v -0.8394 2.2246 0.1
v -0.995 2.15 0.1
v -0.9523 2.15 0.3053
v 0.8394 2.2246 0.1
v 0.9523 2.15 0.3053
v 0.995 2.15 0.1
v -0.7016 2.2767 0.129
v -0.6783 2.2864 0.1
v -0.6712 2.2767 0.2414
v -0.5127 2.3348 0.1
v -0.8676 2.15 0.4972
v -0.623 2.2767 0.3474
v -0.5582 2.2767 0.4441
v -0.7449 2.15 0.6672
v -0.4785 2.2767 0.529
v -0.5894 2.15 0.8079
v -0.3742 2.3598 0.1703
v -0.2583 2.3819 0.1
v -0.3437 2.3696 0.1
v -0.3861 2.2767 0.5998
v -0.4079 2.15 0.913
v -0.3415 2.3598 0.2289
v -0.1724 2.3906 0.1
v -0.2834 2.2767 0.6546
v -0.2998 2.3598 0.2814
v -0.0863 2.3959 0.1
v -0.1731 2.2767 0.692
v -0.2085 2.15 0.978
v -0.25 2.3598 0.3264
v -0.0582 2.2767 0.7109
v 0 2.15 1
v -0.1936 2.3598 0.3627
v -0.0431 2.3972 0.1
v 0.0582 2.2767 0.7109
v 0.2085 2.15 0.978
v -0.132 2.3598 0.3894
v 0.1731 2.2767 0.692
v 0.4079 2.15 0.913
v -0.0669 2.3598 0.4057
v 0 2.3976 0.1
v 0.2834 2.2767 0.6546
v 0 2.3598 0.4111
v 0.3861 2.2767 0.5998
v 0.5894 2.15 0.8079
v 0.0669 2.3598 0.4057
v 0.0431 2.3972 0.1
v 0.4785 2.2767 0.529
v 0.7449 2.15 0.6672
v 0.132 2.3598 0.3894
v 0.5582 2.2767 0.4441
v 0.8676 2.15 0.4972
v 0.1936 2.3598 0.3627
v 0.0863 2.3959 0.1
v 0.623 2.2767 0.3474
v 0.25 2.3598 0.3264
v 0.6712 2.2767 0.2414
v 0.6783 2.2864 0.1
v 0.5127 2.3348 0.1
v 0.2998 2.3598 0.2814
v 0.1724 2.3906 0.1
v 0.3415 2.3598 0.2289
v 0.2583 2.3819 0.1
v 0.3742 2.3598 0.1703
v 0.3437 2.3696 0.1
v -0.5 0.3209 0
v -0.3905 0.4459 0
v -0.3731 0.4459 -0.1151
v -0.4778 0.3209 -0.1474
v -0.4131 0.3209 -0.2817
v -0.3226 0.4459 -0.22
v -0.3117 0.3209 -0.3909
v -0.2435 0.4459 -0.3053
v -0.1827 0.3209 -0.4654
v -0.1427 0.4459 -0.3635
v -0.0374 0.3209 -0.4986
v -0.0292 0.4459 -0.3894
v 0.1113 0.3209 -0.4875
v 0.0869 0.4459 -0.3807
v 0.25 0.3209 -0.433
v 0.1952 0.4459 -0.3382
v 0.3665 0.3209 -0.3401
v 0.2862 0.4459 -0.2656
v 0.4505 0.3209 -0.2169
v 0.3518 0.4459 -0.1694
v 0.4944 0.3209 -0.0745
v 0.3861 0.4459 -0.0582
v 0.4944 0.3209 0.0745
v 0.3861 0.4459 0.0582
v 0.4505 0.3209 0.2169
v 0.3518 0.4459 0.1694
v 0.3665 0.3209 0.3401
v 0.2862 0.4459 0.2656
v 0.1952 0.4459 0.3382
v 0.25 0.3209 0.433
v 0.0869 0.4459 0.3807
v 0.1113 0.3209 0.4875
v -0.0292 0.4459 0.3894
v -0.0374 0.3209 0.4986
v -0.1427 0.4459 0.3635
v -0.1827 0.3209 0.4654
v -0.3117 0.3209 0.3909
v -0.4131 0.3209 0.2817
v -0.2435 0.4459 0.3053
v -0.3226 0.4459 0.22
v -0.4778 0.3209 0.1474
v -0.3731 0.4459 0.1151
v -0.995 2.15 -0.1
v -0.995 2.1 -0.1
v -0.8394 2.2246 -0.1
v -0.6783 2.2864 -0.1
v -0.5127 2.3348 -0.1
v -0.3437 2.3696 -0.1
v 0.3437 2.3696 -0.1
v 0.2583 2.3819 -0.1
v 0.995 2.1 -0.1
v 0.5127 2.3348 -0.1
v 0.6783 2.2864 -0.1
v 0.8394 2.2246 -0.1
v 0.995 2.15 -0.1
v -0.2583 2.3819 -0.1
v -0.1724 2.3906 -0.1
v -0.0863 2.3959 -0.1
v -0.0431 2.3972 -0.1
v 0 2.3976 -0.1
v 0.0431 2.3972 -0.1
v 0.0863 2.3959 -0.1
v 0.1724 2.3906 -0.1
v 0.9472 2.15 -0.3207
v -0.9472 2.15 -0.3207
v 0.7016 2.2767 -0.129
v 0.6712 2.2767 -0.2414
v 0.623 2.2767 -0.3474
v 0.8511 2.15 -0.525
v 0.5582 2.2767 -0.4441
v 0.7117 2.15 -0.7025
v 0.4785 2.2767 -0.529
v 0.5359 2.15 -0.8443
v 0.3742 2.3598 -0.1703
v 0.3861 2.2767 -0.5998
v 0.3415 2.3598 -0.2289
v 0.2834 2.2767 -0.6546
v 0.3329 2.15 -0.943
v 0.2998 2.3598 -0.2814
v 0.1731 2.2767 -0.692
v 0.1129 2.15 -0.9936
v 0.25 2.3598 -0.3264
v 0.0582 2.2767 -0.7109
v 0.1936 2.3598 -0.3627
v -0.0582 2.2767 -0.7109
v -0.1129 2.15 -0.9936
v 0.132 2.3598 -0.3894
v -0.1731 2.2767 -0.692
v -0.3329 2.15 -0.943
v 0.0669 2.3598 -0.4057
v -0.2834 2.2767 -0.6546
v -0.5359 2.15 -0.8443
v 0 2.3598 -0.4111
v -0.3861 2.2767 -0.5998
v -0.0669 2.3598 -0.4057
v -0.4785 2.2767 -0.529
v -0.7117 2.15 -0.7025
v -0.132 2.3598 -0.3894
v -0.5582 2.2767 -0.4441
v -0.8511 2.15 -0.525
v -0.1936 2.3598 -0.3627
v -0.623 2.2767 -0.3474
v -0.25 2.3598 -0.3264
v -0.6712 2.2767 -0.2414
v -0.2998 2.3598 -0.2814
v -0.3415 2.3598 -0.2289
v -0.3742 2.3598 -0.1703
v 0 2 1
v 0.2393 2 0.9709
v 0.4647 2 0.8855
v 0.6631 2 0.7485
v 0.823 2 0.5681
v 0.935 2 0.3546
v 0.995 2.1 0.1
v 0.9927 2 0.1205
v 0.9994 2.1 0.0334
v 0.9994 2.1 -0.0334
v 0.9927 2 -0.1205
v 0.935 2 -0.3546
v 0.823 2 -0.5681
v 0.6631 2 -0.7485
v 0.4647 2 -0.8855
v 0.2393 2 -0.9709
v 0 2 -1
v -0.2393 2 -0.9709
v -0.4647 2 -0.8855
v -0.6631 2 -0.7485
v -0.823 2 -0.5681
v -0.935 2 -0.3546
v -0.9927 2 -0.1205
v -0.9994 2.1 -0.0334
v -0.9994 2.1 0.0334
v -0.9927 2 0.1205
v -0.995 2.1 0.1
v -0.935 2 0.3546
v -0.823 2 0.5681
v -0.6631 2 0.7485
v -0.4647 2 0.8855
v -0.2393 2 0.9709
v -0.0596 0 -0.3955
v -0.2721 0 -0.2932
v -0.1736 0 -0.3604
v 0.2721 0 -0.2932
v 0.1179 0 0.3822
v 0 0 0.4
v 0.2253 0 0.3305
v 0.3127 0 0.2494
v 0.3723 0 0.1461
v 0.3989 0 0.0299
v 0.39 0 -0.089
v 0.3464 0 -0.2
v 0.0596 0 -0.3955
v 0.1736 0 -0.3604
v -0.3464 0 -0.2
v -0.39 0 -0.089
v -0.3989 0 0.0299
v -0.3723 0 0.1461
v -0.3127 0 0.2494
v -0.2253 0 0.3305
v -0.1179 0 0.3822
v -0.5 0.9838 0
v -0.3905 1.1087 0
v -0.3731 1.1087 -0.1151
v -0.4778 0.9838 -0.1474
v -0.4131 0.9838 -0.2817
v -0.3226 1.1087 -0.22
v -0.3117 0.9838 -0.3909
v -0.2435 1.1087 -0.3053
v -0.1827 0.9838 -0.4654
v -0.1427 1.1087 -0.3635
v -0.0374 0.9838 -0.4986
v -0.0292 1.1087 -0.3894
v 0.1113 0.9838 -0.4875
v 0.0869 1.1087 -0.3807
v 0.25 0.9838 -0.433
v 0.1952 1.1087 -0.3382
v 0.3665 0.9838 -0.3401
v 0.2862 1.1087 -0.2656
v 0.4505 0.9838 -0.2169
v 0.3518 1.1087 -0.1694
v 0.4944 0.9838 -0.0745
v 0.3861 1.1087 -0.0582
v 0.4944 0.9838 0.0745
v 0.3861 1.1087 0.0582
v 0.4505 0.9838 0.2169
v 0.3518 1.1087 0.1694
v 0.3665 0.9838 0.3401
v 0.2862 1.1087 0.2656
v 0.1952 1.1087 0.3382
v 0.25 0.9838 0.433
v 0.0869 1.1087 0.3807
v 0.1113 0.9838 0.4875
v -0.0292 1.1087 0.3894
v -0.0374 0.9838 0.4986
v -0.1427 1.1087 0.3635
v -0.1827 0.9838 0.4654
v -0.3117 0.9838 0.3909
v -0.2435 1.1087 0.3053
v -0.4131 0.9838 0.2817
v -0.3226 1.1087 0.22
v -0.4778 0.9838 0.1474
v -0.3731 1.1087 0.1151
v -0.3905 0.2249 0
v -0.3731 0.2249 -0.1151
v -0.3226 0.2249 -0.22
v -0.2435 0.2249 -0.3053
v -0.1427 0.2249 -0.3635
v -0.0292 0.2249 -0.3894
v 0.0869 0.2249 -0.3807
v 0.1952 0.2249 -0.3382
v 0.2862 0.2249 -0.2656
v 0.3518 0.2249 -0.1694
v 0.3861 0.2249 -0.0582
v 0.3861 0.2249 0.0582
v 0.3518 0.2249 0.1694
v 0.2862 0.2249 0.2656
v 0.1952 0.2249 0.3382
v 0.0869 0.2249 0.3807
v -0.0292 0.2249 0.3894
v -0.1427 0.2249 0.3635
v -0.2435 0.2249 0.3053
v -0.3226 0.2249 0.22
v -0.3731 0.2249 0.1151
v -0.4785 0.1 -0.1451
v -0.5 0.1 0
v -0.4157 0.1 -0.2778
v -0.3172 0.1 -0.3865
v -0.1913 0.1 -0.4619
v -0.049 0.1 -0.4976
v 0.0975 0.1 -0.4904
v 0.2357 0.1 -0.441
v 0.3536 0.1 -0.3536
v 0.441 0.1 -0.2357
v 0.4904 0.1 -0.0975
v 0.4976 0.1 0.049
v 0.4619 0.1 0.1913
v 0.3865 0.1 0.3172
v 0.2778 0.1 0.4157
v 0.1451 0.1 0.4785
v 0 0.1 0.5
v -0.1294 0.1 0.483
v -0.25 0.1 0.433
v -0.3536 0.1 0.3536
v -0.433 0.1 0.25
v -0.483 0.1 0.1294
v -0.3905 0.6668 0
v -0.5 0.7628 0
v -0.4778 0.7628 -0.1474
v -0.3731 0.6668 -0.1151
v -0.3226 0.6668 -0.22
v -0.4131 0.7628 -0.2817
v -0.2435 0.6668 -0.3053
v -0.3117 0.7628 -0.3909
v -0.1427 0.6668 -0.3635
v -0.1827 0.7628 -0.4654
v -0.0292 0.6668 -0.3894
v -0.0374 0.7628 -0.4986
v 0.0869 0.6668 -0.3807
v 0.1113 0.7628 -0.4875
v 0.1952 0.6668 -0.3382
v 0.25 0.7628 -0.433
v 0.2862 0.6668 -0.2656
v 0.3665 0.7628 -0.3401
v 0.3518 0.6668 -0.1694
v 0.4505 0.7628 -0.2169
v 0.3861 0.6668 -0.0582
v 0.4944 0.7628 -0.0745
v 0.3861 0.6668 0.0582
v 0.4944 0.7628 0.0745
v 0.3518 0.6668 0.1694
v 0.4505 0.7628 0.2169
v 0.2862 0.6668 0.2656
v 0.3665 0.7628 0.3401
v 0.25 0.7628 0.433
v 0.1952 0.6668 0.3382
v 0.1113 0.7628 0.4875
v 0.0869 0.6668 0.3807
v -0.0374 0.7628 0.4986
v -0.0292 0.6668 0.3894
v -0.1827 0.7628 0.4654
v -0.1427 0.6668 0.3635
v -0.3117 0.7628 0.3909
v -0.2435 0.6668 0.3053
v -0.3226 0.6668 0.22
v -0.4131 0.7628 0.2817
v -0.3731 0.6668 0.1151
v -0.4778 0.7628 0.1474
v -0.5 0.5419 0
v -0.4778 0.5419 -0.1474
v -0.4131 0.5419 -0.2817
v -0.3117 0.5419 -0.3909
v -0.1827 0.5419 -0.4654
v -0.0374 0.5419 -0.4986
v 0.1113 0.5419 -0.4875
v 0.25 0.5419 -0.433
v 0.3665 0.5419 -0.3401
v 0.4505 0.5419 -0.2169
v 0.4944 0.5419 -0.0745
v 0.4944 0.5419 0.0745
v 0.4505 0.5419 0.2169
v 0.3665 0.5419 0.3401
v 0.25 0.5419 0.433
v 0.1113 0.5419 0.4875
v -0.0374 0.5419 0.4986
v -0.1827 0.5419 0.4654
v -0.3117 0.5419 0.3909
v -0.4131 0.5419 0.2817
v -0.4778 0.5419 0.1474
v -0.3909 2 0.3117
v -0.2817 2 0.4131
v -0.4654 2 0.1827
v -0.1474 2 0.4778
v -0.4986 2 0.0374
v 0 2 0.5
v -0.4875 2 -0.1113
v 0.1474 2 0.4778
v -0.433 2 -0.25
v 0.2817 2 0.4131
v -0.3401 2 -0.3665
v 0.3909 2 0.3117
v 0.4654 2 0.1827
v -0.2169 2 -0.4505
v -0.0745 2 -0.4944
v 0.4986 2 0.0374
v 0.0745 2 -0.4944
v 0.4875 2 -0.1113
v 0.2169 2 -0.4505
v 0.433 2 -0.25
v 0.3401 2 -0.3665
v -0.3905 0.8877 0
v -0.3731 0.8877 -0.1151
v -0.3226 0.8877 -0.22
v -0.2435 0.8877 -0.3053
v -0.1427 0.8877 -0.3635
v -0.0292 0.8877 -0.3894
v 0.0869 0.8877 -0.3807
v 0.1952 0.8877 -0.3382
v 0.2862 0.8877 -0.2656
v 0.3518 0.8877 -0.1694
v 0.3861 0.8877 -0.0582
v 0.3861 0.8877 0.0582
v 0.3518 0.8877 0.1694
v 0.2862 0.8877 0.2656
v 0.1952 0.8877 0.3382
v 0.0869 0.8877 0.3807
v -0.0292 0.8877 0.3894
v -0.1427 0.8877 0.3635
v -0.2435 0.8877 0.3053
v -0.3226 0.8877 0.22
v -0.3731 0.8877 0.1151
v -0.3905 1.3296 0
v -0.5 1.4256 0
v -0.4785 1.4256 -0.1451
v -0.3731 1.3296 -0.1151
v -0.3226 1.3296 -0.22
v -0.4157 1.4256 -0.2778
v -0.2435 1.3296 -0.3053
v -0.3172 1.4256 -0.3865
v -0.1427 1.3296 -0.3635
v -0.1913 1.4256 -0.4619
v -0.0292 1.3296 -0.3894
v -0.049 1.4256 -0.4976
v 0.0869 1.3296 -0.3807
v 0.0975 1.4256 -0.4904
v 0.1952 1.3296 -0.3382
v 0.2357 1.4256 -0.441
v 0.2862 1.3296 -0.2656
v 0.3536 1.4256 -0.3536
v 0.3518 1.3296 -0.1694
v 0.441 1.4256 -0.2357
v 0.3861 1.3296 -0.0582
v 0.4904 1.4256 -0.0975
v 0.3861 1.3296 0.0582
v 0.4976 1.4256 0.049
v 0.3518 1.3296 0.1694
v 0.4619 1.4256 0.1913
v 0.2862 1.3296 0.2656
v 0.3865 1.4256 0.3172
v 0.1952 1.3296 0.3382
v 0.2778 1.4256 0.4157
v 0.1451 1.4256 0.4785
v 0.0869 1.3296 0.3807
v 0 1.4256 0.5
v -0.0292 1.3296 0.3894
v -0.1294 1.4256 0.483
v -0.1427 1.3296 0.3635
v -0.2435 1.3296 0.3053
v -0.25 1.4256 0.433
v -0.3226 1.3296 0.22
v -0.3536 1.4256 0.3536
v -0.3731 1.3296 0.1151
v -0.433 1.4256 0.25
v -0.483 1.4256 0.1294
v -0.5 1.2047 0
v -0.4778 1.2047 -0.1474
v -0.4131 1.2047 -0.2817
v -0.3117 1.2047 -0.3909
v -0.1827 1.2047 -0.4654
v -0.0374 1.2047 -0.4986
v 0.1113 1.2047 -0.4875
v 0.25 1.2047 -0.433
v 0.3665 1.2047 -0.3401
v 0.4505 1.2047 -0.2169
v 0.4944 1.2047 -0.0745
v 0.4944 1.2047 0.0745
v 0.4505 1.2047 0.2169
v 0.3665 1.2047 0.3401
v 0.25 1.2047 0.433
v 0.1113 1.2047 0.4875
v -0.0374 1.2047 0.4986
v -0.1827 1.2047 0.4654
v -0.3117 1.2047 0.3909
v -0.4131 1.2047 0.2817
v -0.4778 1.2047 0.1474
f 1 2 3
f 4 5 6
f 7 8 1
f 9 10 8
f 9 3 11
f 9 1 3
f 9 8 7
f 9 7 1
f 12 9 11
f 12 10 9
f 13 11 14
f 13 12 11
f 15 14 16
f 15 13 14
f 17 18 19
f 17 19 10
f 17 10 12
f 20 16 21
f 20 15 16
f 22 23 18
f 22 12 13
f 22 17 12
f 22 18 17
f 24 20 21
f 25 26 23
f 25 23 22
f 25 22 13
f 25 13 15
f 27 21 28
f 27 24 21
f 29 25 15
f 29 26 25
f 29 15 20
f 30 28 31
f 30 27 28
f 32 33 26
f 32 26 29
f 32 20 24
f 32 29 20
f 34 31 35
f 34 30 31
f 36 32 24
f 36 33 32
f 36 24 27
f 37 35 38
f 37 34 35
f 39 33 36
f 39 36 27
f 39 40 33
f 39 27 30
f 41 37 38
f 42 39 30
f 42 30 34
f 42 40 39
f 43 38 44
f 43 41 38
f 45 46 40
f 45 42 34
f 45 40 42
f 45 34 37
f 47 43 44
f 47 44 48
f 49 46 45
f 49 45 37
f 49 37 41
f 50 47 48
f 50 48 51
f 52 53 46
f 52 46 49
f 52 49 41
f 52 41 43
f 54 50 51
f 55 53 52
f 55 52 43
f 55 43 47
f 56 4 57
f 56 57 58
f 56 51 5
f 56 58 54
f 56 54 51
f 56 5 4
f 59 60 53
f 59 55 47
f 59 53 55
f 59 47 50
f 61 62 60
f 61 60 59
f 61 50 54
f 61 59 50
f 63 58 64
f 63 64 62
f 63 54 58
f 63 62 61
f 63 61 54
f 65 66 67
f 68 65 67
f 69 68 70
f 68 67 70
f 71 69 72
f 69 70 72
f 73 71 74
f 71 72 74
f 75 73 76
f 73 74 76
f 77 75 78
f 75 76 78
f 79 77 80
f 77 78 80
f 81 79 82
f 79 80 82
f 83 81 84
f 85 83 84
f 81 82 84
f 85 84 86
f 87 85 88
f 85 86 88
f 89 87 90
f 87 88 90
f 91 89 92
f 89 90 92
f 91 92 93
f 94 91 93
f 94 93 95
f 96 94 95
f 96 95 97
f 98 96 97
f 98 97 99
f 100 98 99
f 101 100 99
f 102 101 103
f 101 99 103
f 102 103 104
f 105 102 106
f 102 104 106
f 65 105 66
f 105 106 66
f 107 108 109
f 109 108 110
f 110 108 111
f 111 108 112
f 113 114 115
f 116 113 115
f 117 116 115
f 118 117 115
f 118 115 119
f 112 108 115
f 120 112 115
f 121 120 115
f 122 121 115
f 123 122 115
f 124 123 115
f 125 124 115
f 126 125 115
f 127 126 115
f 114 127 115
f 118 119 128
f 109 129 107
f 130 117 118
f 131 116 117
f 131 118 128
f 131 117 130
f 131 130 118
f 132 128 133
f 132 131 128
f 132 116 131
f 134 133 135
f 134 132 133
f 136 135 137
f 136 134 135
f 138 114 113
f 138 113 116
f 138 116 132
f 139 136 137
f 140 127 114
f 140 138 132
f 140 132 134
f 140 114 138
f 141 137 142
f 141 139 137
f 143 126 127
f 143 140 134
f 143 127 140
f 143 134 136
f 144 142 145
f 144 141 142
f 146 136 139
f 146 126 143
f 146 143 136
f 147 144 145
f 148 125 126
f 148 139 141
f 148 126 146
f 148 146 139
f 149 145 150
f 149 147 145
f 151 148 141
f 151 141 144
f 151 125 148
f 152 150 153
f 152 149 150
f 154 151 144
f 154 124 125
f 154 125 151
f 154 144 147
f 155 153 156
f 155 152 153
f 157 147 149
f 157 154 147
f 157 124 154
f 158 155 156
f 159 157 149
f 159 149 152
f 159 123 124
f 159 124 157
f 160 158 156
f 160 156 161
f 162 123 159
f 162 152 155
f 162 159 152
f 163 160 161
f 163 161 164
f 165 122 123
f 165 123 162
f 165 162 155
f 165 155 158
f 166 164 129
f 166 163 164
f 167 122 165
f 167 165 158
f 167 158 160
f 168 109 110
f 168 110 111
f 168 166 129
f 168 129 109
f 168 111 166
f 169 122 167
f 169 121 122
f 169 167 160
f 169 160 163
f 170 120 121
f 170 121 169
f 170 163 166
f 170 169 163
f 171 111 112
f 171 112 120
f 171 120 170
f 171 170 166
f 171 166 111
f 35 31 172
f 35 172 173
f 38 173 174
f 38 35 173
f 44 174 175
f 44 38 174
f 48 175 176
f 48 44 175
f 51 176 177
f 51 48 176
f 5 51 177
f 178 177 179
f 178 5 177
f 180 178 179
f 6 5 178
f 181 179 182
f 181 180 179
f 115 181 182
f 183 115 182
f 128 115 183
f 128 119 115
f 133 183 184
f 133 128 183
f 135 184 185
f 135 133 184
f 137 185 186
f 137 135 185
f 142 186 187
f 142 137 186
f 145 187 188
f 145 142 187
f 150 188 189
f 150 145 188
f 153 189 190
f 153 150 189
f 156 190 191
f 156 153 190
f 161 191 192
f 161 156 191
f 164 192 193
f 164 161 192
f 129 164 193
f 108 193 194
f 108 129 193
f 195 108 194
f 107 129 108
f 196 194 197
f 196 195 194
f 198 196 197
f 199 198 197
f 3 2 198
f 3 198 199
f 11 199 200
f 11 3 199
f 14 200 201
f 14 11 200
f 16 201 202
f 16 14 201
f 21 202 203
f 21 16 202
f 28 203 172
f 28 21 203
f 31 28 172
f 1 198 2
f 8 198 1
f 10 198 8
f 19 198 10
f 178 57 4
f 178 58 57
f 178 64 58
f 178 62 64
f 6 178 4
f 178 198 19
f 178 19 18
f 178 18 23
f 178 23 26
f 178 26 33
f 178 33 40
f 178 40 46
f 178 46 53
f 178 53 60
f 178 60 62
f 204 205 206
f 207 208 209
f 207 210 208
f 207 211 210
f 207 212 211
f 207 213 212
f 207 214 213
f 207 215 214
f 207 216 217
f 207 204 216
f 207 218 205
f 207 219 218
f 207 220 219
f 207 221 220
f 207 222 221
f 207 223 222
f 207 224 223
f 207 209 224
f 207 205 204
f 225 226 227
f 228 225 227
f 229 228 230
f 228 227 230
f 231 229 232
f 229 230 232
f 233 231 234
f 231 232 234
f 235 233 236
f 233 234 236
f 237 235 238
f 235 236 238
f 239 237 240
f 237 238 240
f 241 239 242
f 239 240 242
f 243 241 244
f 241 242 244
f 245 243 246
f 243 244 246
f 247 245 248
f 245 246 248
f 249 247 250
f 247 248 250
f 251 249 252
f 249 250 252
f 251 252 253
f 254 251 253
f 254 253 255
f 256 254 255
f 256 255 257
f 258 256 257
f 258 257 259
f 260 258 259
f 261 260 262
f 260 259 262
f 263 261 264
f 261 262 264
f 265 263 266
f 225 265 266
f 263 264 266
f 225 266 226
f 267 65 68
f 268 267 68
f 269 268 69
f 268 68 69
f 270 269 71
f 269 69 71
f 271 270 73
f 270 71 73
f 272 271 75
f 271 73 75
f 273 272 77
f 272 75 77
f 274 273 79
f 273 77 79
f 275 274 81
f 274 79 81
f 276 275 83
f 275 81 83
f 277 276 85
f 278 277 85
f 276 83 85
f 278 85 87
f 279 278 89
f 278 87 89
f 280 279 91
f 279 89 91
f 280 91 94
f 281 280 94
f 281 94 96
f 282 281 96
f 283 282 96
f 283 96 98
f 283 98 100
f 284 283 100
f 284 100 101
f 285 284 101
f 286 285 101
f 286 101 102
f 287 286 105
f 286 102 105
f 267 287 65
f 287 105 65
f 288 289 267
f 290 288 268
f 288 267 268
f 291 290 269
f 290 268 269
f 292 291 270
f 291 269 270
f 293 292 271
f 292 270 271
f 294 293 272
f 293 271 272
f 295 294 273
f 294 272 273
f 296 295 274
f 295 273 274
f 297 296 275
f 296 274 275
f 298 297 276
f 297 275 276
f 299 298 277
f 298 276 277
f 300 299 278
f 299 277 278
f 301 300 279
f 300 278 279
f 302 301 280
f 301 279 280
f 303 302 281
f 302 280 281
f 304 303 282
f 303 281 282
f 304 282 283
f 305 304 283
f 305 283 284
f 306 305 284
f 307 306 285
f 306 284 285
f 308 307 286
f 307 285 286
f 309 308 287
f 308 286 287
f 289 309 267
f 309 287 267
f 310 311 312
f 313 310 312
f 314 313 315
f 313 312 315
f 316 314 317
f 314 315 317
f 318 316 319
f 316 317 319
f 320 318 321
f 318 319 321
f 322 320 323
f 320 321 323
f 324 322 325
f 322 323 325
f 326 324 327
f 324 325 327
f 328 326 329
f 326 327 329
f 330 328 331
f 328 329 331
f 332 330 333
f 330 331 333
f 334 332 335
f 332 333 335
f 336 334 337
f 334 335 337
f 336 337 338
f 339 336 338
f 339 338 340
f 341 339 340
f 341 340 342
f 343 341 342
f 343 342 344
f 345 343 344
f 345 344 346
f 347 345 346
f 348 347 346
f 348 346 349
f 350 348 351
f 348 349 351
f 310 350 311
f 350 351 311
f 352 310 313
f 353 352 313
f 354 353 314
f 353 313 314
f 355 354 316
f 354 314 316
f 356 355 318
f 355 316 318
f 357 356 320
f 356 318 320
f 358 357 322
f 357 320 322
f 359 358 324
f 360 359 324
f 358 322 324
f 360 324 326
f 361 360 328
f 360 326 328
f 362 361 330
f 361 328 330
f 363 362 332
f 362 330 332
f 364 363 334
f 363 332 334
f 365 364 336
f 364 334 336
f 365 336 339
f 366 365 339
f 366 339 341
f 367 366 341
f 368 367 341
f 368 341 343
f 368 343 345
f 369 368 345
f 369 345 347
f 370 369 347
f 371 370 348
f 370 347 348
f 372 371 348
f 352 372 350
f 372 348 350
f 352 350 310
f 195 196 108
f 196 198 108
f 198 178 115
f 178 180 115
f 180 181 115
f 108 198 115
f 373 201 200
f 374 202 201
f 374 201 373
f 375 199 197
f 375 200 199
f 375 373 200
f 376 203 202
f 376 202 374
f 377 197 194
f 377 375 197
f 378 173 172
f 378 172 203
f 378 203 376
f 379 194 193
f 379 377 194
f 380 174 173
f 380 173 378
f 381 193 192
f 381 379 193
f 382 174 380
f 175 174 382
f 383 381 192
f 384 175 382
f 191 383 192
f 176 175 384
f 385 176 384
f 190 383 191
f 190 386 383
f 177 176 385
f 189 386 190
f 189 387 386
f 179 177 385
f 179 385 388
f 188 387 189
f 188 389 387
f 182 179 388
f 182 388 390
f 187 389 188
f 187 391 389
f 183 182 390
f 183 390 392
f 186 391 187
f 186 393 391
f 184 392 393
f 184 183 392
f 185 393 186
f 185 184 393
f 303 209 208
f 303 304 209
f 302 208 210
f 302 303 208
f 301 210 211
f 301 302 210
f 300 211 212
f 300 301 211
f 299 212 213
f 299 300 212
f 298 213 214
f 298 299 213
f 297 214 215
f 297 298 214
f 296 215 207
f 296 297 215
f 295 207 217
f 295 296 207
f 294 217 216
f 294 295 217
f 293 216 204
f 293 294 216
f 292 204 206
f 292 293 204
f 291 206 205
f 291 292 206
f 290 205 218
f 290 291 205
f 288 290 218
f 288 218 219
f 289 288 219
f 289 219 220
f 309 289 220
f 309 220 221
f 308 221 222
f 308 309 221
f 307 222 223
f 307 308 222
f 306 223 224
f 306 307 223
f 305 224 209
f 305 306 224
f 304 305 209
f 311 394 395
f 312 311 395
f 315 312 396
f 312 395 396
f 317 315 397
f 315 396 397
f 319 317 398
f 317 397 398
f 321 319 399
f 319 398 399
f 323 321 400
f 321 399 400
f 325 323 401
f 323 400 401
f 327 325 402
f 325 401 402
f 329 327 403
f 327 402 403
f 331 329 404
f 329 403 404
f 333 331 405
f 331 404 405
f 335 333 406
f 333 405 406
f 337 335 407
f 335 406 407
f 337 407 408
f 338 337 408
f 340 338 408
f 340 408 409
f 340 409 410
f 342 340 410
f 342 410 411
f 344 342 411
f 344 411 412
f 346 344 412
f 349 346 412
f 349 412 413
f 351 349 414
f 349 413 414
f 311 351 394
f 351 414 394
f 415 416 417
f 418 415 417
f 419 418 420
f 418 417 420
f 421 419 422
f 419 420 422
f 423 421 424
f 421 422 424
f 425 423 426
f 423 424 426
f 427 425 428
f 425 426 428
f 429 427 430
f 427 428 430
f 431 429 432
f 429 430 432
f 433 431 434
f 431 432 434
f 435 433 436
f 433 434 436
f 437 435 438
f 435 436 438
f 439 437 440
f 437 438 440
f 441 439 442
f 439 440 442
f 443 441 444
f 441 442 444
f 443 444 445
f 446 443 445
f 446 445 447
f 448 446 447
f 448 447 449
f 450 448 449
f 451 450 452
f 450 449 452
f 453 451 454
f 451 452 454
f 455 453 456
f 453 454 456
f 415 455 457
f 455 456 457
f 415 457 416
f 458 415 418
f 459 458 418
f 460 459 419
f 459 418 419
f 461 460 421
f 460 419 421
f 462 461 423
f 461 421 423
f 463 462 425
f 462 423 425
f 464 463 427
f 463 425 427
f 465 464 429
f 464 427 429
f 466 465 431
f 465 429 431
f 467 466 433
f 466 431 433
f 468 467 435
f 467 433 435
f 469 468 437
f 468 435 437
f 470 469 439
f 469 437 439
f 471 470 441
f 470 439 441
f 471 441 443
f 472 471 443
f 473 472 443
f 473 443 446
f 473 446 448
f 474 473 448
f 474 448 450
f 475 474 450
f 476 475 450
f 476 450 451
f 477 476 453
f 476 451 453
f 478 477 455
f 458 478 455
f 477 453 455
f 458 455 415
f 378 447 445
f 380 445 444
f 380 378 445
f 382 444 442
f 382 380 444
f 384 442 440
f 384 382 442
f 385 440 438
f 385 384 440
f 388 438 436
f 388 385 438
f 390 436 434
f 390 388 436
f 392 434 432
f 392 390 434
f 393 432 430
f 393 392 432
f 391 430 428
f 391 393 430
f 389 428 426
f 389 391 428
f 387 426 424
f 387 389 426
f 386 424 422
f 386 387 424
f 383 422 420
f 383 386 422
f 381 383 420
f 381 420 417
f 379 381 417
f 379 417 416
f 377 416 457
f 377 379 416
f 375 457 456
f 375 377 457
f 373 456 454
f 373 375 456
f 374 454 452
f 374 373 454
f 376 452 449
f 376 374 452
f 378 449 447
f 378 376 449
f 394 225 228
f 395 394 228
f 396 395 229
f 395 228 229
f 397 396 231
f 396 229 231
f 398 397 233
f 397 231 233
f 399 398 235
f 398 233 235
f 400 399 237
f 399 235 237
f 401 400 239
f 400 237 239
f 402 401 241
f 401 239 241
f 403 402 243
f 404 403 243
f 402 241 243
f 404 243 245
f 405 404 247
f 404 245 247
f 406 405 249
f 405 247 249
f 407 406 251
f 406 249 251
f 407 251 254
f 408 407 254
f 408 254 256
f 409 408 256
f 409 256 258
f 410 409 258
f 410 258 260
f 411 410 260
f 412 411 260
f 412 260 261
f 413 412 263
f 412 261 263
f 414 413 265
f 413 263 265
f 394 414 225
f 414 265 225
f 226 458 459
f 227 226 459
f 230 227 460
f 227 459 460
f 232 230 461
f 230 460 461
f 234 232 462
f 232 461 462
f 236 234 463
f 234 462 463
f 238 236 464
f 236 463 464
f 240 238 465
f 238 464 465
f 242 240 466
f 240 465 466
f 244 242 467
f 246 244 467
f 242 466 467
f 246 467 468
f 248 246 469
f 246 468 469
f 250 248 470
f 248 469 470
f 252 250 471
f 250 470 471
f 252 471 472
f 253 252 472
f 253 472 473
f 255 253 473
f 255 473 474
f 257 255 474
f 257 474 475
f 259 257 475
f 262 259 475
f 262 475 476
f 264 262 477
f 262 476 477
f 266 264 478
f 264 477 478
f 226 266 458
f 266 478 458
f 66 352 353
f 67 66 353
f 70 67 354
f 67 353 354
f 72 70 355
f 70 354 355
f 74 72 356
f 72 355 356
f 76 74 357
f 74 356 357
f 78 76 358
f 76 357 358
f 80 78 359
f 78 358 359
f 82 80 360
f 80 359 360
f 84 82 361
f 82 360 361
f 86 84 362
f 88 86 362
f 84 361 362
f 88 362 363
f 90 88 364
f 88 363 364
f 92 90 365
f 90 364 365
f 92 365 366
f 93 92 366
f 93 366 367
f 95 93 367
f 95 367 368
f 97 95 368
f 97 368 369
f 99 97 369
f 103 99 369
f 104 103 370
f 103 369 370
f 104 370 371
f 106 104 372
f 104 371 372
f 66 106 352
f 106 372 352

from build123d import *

# Parameters (mm, degrees)
ESQUISSE2_W             = 0.2
ESQUISSE2_H             = 0.6
ENL_V_MAT_EXTRU_1_DEPTH = 1.5
CHANFREIN1_SIZE         = 0.1


with BuildPart() as part:
    # Esquisse1 → Révolution1 (revolve)
    with BuildSketch(Plane(origin=(0, 0, 0), x_dir=(0, 0, -1), z_dir=(1, 0, 0))):
        with BuildLine():
            Line((0, 0), (-0.5, 0))
            Line((-0.5, 0), (-0.5, 2))
            Line((-0.5, 2), (-1, 2))
            Line((-1, 2), (-1, 2.15))
            ThreePointArc((-1, 2.15), (-0.515388203, 2.336552813), (0, 2.4))
            Line((0, 2.4), (0, 0))
        make_face()
    revolve(axis=Axis((0, 0, 0), (0, 1, 0)))

    # Esquisse2 → Enlèv. mat.-Extru.1 (cut, symmetric)
    with BuildSketch(Plane(origin=(0, 0, 0), x_dir=(0, 0, -1), z_dir=(1, 0, 0))):
        with Locations((0, 2.4)):
            Rectangle(ESQUISSE2_W, ESQUISSE2_H)
    extrude(amount=ENL_V_MAT_EXTRU_1_DEPTH, both=True, mode=Mode.SUBTRACT)

    # Chanfrein1
    chanfrein1_edges = [part.edges().sort_by_distance(p)[0] for p in [
        (0, 0, -0.5),
    ]]
    chamfer(chanfrein1_edges, length=CHANFREIN1_SIZE)

    # Esquisse3 → Enlèvement de matière-Révolution1 (revolve, cut)
    with BuildSketch(Plane.XY):
        Polygon((-0.5, 0.1), (-0.390480074, 0.224919634), (-0.5, 0.32093828), (-0.390480074, 0.445857914), (-0.5, 0.541876561), (-0.390480074, 0.666796195), (-0.5, 0.762814841), (-0.390480074, 0.887734475), (-0.5, 0.983753122), (-0.390480074, 1.108672755), (-0.5, 1.204691402), (-0.390480074, 1.329611036), (-0.5, 1.425629682), (-0.822305097, 1.425629682), (-0.822305097, 0.1), align=None)
    revolve(axis=Axis((0, 0, 0), (0, -1, 0)), mode=Mode.SUBTRACT)


solid = part.part
